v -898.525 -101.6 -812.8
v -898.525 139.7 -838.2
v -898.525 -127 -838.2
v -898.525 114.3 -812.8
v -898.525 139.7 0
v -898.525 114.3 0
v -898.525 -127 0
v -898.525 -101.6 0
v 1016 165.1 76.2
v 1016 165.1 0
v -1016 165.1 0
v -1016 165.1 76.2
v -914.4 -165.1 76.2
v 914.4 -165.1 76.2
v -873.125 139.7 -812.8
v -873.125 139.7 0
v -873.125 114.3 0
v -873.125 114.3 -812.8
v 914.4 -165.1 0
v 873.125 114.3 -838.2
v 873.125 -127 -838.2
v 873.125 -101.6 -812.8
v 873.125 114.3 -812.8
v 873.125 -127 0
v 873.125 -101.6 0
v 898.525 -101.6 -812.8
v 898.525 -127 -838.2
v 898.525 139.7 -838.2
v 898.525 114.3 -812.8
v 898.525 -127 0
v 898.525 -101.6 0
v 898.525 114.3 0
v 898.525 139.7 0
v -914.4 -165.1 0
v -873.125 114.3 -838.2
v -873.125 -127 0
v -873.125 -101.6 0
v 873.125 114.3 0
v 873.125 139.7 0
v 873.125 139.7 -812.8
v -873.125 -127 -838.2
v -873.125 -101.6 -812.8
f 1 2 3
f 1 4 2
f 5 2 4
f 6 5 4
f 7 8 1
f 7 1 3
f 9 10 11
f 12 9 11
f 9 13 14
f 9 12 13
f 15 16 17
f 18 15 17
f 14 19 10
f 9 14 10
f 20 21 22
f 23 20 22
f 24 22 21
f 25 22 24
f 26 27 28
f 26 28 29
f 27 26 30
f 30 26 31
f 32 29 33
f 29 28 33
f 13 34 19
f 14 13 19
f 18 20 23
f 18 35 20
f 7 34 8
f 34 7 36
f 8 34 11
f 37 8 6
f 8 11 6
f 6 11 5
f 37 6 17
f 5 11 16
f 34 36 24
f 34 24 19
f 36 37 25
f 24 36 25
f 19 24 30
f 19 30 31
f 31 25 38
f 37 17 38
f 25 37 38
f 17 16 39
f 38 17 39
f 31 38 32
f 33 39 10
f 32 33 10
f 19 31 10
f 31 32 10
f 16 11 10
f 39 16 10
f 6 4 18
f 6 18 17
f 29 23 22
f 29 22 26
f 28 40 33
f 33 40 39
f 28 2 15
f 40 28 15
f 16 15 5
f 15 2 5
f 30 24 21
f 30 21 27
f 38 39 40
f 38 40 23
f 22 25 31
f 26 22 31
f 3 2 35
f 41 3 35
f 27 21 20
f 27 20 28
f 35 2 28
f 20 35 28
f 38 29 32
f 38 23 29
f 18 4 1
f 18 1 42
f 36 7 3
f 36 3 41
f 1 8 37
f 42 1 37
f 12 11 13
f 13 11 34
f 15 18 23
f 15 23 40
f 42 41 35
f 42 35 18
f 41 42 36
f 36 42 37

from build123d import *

# Parameters (mm, degrees)
F0_W     = 1828.8
F0_H     = 330.2
F1_DEPTH = 76.2
F2_W     = 25.4
F2_H     = 25.4
F3_DEPTH = 838.2
F4_W     = 25.4
F4_H     = 25.4
F5_DEPTH = 1746.25
F6_W     = 25.4
F6_H     = 25.4
F7_DEPTH = 215.9


with BuildPart() as f1:
    # F0 (on Top) → F1 (new body)
    with BuildSketch(Plane.XY):
        Rectangle(F0_W, F0_H)
        Polygon((-914.4, -165.1), (-914.4, 165.1), (-1016, 165.1), align=None)
        Polygon((1016, 165.1), (914.4, 165.1), (914.4, -165.1), align=None)
    extrude(amount=F1_DEPTH)

    # F2 (on face) → F3 (join)
    with BuildSketch(Plane(origin=(0, 0, 0), x_dir=(1, 0, 0), z_dir=(0, 0, -1))):
        with Locations((885.825, 114.3)):
            Rectangle(F2_W, F2_H)
        with Locations((-885.825, 114.3)):
            Rectangle(F2_W, F2_H)
        with Locations((-885.825, -127)):
            Rectangle(F2_W, F2_H)
        with Locations((885.825, -127)):
            Rectangle(F2_W, F2_H)
    extrude(amount=F3_DEPTH)

    # F4 (on face) → F5 (join, through all)
    with BuildSketch(Plane.YZ.offset(-873.125)):
        with Locations((127, -825.5)):
            Rectangle(F4_W, F4_H)
    extrude(amount=F5_DEPTH)

    # F6 (on face) → F7 (join, through all)
    with BuildSketch(Plane.XZ.offset(-114.3)):
        with Locations((885.825, -825.5)):
            Rectangle(F6_W, F6_H)
        with Locations((-885.825, -825.5)):
            Rectangle(F6_W, F6_H)
    extrude(amount=F7_DEPTH)


solid = f1.part
